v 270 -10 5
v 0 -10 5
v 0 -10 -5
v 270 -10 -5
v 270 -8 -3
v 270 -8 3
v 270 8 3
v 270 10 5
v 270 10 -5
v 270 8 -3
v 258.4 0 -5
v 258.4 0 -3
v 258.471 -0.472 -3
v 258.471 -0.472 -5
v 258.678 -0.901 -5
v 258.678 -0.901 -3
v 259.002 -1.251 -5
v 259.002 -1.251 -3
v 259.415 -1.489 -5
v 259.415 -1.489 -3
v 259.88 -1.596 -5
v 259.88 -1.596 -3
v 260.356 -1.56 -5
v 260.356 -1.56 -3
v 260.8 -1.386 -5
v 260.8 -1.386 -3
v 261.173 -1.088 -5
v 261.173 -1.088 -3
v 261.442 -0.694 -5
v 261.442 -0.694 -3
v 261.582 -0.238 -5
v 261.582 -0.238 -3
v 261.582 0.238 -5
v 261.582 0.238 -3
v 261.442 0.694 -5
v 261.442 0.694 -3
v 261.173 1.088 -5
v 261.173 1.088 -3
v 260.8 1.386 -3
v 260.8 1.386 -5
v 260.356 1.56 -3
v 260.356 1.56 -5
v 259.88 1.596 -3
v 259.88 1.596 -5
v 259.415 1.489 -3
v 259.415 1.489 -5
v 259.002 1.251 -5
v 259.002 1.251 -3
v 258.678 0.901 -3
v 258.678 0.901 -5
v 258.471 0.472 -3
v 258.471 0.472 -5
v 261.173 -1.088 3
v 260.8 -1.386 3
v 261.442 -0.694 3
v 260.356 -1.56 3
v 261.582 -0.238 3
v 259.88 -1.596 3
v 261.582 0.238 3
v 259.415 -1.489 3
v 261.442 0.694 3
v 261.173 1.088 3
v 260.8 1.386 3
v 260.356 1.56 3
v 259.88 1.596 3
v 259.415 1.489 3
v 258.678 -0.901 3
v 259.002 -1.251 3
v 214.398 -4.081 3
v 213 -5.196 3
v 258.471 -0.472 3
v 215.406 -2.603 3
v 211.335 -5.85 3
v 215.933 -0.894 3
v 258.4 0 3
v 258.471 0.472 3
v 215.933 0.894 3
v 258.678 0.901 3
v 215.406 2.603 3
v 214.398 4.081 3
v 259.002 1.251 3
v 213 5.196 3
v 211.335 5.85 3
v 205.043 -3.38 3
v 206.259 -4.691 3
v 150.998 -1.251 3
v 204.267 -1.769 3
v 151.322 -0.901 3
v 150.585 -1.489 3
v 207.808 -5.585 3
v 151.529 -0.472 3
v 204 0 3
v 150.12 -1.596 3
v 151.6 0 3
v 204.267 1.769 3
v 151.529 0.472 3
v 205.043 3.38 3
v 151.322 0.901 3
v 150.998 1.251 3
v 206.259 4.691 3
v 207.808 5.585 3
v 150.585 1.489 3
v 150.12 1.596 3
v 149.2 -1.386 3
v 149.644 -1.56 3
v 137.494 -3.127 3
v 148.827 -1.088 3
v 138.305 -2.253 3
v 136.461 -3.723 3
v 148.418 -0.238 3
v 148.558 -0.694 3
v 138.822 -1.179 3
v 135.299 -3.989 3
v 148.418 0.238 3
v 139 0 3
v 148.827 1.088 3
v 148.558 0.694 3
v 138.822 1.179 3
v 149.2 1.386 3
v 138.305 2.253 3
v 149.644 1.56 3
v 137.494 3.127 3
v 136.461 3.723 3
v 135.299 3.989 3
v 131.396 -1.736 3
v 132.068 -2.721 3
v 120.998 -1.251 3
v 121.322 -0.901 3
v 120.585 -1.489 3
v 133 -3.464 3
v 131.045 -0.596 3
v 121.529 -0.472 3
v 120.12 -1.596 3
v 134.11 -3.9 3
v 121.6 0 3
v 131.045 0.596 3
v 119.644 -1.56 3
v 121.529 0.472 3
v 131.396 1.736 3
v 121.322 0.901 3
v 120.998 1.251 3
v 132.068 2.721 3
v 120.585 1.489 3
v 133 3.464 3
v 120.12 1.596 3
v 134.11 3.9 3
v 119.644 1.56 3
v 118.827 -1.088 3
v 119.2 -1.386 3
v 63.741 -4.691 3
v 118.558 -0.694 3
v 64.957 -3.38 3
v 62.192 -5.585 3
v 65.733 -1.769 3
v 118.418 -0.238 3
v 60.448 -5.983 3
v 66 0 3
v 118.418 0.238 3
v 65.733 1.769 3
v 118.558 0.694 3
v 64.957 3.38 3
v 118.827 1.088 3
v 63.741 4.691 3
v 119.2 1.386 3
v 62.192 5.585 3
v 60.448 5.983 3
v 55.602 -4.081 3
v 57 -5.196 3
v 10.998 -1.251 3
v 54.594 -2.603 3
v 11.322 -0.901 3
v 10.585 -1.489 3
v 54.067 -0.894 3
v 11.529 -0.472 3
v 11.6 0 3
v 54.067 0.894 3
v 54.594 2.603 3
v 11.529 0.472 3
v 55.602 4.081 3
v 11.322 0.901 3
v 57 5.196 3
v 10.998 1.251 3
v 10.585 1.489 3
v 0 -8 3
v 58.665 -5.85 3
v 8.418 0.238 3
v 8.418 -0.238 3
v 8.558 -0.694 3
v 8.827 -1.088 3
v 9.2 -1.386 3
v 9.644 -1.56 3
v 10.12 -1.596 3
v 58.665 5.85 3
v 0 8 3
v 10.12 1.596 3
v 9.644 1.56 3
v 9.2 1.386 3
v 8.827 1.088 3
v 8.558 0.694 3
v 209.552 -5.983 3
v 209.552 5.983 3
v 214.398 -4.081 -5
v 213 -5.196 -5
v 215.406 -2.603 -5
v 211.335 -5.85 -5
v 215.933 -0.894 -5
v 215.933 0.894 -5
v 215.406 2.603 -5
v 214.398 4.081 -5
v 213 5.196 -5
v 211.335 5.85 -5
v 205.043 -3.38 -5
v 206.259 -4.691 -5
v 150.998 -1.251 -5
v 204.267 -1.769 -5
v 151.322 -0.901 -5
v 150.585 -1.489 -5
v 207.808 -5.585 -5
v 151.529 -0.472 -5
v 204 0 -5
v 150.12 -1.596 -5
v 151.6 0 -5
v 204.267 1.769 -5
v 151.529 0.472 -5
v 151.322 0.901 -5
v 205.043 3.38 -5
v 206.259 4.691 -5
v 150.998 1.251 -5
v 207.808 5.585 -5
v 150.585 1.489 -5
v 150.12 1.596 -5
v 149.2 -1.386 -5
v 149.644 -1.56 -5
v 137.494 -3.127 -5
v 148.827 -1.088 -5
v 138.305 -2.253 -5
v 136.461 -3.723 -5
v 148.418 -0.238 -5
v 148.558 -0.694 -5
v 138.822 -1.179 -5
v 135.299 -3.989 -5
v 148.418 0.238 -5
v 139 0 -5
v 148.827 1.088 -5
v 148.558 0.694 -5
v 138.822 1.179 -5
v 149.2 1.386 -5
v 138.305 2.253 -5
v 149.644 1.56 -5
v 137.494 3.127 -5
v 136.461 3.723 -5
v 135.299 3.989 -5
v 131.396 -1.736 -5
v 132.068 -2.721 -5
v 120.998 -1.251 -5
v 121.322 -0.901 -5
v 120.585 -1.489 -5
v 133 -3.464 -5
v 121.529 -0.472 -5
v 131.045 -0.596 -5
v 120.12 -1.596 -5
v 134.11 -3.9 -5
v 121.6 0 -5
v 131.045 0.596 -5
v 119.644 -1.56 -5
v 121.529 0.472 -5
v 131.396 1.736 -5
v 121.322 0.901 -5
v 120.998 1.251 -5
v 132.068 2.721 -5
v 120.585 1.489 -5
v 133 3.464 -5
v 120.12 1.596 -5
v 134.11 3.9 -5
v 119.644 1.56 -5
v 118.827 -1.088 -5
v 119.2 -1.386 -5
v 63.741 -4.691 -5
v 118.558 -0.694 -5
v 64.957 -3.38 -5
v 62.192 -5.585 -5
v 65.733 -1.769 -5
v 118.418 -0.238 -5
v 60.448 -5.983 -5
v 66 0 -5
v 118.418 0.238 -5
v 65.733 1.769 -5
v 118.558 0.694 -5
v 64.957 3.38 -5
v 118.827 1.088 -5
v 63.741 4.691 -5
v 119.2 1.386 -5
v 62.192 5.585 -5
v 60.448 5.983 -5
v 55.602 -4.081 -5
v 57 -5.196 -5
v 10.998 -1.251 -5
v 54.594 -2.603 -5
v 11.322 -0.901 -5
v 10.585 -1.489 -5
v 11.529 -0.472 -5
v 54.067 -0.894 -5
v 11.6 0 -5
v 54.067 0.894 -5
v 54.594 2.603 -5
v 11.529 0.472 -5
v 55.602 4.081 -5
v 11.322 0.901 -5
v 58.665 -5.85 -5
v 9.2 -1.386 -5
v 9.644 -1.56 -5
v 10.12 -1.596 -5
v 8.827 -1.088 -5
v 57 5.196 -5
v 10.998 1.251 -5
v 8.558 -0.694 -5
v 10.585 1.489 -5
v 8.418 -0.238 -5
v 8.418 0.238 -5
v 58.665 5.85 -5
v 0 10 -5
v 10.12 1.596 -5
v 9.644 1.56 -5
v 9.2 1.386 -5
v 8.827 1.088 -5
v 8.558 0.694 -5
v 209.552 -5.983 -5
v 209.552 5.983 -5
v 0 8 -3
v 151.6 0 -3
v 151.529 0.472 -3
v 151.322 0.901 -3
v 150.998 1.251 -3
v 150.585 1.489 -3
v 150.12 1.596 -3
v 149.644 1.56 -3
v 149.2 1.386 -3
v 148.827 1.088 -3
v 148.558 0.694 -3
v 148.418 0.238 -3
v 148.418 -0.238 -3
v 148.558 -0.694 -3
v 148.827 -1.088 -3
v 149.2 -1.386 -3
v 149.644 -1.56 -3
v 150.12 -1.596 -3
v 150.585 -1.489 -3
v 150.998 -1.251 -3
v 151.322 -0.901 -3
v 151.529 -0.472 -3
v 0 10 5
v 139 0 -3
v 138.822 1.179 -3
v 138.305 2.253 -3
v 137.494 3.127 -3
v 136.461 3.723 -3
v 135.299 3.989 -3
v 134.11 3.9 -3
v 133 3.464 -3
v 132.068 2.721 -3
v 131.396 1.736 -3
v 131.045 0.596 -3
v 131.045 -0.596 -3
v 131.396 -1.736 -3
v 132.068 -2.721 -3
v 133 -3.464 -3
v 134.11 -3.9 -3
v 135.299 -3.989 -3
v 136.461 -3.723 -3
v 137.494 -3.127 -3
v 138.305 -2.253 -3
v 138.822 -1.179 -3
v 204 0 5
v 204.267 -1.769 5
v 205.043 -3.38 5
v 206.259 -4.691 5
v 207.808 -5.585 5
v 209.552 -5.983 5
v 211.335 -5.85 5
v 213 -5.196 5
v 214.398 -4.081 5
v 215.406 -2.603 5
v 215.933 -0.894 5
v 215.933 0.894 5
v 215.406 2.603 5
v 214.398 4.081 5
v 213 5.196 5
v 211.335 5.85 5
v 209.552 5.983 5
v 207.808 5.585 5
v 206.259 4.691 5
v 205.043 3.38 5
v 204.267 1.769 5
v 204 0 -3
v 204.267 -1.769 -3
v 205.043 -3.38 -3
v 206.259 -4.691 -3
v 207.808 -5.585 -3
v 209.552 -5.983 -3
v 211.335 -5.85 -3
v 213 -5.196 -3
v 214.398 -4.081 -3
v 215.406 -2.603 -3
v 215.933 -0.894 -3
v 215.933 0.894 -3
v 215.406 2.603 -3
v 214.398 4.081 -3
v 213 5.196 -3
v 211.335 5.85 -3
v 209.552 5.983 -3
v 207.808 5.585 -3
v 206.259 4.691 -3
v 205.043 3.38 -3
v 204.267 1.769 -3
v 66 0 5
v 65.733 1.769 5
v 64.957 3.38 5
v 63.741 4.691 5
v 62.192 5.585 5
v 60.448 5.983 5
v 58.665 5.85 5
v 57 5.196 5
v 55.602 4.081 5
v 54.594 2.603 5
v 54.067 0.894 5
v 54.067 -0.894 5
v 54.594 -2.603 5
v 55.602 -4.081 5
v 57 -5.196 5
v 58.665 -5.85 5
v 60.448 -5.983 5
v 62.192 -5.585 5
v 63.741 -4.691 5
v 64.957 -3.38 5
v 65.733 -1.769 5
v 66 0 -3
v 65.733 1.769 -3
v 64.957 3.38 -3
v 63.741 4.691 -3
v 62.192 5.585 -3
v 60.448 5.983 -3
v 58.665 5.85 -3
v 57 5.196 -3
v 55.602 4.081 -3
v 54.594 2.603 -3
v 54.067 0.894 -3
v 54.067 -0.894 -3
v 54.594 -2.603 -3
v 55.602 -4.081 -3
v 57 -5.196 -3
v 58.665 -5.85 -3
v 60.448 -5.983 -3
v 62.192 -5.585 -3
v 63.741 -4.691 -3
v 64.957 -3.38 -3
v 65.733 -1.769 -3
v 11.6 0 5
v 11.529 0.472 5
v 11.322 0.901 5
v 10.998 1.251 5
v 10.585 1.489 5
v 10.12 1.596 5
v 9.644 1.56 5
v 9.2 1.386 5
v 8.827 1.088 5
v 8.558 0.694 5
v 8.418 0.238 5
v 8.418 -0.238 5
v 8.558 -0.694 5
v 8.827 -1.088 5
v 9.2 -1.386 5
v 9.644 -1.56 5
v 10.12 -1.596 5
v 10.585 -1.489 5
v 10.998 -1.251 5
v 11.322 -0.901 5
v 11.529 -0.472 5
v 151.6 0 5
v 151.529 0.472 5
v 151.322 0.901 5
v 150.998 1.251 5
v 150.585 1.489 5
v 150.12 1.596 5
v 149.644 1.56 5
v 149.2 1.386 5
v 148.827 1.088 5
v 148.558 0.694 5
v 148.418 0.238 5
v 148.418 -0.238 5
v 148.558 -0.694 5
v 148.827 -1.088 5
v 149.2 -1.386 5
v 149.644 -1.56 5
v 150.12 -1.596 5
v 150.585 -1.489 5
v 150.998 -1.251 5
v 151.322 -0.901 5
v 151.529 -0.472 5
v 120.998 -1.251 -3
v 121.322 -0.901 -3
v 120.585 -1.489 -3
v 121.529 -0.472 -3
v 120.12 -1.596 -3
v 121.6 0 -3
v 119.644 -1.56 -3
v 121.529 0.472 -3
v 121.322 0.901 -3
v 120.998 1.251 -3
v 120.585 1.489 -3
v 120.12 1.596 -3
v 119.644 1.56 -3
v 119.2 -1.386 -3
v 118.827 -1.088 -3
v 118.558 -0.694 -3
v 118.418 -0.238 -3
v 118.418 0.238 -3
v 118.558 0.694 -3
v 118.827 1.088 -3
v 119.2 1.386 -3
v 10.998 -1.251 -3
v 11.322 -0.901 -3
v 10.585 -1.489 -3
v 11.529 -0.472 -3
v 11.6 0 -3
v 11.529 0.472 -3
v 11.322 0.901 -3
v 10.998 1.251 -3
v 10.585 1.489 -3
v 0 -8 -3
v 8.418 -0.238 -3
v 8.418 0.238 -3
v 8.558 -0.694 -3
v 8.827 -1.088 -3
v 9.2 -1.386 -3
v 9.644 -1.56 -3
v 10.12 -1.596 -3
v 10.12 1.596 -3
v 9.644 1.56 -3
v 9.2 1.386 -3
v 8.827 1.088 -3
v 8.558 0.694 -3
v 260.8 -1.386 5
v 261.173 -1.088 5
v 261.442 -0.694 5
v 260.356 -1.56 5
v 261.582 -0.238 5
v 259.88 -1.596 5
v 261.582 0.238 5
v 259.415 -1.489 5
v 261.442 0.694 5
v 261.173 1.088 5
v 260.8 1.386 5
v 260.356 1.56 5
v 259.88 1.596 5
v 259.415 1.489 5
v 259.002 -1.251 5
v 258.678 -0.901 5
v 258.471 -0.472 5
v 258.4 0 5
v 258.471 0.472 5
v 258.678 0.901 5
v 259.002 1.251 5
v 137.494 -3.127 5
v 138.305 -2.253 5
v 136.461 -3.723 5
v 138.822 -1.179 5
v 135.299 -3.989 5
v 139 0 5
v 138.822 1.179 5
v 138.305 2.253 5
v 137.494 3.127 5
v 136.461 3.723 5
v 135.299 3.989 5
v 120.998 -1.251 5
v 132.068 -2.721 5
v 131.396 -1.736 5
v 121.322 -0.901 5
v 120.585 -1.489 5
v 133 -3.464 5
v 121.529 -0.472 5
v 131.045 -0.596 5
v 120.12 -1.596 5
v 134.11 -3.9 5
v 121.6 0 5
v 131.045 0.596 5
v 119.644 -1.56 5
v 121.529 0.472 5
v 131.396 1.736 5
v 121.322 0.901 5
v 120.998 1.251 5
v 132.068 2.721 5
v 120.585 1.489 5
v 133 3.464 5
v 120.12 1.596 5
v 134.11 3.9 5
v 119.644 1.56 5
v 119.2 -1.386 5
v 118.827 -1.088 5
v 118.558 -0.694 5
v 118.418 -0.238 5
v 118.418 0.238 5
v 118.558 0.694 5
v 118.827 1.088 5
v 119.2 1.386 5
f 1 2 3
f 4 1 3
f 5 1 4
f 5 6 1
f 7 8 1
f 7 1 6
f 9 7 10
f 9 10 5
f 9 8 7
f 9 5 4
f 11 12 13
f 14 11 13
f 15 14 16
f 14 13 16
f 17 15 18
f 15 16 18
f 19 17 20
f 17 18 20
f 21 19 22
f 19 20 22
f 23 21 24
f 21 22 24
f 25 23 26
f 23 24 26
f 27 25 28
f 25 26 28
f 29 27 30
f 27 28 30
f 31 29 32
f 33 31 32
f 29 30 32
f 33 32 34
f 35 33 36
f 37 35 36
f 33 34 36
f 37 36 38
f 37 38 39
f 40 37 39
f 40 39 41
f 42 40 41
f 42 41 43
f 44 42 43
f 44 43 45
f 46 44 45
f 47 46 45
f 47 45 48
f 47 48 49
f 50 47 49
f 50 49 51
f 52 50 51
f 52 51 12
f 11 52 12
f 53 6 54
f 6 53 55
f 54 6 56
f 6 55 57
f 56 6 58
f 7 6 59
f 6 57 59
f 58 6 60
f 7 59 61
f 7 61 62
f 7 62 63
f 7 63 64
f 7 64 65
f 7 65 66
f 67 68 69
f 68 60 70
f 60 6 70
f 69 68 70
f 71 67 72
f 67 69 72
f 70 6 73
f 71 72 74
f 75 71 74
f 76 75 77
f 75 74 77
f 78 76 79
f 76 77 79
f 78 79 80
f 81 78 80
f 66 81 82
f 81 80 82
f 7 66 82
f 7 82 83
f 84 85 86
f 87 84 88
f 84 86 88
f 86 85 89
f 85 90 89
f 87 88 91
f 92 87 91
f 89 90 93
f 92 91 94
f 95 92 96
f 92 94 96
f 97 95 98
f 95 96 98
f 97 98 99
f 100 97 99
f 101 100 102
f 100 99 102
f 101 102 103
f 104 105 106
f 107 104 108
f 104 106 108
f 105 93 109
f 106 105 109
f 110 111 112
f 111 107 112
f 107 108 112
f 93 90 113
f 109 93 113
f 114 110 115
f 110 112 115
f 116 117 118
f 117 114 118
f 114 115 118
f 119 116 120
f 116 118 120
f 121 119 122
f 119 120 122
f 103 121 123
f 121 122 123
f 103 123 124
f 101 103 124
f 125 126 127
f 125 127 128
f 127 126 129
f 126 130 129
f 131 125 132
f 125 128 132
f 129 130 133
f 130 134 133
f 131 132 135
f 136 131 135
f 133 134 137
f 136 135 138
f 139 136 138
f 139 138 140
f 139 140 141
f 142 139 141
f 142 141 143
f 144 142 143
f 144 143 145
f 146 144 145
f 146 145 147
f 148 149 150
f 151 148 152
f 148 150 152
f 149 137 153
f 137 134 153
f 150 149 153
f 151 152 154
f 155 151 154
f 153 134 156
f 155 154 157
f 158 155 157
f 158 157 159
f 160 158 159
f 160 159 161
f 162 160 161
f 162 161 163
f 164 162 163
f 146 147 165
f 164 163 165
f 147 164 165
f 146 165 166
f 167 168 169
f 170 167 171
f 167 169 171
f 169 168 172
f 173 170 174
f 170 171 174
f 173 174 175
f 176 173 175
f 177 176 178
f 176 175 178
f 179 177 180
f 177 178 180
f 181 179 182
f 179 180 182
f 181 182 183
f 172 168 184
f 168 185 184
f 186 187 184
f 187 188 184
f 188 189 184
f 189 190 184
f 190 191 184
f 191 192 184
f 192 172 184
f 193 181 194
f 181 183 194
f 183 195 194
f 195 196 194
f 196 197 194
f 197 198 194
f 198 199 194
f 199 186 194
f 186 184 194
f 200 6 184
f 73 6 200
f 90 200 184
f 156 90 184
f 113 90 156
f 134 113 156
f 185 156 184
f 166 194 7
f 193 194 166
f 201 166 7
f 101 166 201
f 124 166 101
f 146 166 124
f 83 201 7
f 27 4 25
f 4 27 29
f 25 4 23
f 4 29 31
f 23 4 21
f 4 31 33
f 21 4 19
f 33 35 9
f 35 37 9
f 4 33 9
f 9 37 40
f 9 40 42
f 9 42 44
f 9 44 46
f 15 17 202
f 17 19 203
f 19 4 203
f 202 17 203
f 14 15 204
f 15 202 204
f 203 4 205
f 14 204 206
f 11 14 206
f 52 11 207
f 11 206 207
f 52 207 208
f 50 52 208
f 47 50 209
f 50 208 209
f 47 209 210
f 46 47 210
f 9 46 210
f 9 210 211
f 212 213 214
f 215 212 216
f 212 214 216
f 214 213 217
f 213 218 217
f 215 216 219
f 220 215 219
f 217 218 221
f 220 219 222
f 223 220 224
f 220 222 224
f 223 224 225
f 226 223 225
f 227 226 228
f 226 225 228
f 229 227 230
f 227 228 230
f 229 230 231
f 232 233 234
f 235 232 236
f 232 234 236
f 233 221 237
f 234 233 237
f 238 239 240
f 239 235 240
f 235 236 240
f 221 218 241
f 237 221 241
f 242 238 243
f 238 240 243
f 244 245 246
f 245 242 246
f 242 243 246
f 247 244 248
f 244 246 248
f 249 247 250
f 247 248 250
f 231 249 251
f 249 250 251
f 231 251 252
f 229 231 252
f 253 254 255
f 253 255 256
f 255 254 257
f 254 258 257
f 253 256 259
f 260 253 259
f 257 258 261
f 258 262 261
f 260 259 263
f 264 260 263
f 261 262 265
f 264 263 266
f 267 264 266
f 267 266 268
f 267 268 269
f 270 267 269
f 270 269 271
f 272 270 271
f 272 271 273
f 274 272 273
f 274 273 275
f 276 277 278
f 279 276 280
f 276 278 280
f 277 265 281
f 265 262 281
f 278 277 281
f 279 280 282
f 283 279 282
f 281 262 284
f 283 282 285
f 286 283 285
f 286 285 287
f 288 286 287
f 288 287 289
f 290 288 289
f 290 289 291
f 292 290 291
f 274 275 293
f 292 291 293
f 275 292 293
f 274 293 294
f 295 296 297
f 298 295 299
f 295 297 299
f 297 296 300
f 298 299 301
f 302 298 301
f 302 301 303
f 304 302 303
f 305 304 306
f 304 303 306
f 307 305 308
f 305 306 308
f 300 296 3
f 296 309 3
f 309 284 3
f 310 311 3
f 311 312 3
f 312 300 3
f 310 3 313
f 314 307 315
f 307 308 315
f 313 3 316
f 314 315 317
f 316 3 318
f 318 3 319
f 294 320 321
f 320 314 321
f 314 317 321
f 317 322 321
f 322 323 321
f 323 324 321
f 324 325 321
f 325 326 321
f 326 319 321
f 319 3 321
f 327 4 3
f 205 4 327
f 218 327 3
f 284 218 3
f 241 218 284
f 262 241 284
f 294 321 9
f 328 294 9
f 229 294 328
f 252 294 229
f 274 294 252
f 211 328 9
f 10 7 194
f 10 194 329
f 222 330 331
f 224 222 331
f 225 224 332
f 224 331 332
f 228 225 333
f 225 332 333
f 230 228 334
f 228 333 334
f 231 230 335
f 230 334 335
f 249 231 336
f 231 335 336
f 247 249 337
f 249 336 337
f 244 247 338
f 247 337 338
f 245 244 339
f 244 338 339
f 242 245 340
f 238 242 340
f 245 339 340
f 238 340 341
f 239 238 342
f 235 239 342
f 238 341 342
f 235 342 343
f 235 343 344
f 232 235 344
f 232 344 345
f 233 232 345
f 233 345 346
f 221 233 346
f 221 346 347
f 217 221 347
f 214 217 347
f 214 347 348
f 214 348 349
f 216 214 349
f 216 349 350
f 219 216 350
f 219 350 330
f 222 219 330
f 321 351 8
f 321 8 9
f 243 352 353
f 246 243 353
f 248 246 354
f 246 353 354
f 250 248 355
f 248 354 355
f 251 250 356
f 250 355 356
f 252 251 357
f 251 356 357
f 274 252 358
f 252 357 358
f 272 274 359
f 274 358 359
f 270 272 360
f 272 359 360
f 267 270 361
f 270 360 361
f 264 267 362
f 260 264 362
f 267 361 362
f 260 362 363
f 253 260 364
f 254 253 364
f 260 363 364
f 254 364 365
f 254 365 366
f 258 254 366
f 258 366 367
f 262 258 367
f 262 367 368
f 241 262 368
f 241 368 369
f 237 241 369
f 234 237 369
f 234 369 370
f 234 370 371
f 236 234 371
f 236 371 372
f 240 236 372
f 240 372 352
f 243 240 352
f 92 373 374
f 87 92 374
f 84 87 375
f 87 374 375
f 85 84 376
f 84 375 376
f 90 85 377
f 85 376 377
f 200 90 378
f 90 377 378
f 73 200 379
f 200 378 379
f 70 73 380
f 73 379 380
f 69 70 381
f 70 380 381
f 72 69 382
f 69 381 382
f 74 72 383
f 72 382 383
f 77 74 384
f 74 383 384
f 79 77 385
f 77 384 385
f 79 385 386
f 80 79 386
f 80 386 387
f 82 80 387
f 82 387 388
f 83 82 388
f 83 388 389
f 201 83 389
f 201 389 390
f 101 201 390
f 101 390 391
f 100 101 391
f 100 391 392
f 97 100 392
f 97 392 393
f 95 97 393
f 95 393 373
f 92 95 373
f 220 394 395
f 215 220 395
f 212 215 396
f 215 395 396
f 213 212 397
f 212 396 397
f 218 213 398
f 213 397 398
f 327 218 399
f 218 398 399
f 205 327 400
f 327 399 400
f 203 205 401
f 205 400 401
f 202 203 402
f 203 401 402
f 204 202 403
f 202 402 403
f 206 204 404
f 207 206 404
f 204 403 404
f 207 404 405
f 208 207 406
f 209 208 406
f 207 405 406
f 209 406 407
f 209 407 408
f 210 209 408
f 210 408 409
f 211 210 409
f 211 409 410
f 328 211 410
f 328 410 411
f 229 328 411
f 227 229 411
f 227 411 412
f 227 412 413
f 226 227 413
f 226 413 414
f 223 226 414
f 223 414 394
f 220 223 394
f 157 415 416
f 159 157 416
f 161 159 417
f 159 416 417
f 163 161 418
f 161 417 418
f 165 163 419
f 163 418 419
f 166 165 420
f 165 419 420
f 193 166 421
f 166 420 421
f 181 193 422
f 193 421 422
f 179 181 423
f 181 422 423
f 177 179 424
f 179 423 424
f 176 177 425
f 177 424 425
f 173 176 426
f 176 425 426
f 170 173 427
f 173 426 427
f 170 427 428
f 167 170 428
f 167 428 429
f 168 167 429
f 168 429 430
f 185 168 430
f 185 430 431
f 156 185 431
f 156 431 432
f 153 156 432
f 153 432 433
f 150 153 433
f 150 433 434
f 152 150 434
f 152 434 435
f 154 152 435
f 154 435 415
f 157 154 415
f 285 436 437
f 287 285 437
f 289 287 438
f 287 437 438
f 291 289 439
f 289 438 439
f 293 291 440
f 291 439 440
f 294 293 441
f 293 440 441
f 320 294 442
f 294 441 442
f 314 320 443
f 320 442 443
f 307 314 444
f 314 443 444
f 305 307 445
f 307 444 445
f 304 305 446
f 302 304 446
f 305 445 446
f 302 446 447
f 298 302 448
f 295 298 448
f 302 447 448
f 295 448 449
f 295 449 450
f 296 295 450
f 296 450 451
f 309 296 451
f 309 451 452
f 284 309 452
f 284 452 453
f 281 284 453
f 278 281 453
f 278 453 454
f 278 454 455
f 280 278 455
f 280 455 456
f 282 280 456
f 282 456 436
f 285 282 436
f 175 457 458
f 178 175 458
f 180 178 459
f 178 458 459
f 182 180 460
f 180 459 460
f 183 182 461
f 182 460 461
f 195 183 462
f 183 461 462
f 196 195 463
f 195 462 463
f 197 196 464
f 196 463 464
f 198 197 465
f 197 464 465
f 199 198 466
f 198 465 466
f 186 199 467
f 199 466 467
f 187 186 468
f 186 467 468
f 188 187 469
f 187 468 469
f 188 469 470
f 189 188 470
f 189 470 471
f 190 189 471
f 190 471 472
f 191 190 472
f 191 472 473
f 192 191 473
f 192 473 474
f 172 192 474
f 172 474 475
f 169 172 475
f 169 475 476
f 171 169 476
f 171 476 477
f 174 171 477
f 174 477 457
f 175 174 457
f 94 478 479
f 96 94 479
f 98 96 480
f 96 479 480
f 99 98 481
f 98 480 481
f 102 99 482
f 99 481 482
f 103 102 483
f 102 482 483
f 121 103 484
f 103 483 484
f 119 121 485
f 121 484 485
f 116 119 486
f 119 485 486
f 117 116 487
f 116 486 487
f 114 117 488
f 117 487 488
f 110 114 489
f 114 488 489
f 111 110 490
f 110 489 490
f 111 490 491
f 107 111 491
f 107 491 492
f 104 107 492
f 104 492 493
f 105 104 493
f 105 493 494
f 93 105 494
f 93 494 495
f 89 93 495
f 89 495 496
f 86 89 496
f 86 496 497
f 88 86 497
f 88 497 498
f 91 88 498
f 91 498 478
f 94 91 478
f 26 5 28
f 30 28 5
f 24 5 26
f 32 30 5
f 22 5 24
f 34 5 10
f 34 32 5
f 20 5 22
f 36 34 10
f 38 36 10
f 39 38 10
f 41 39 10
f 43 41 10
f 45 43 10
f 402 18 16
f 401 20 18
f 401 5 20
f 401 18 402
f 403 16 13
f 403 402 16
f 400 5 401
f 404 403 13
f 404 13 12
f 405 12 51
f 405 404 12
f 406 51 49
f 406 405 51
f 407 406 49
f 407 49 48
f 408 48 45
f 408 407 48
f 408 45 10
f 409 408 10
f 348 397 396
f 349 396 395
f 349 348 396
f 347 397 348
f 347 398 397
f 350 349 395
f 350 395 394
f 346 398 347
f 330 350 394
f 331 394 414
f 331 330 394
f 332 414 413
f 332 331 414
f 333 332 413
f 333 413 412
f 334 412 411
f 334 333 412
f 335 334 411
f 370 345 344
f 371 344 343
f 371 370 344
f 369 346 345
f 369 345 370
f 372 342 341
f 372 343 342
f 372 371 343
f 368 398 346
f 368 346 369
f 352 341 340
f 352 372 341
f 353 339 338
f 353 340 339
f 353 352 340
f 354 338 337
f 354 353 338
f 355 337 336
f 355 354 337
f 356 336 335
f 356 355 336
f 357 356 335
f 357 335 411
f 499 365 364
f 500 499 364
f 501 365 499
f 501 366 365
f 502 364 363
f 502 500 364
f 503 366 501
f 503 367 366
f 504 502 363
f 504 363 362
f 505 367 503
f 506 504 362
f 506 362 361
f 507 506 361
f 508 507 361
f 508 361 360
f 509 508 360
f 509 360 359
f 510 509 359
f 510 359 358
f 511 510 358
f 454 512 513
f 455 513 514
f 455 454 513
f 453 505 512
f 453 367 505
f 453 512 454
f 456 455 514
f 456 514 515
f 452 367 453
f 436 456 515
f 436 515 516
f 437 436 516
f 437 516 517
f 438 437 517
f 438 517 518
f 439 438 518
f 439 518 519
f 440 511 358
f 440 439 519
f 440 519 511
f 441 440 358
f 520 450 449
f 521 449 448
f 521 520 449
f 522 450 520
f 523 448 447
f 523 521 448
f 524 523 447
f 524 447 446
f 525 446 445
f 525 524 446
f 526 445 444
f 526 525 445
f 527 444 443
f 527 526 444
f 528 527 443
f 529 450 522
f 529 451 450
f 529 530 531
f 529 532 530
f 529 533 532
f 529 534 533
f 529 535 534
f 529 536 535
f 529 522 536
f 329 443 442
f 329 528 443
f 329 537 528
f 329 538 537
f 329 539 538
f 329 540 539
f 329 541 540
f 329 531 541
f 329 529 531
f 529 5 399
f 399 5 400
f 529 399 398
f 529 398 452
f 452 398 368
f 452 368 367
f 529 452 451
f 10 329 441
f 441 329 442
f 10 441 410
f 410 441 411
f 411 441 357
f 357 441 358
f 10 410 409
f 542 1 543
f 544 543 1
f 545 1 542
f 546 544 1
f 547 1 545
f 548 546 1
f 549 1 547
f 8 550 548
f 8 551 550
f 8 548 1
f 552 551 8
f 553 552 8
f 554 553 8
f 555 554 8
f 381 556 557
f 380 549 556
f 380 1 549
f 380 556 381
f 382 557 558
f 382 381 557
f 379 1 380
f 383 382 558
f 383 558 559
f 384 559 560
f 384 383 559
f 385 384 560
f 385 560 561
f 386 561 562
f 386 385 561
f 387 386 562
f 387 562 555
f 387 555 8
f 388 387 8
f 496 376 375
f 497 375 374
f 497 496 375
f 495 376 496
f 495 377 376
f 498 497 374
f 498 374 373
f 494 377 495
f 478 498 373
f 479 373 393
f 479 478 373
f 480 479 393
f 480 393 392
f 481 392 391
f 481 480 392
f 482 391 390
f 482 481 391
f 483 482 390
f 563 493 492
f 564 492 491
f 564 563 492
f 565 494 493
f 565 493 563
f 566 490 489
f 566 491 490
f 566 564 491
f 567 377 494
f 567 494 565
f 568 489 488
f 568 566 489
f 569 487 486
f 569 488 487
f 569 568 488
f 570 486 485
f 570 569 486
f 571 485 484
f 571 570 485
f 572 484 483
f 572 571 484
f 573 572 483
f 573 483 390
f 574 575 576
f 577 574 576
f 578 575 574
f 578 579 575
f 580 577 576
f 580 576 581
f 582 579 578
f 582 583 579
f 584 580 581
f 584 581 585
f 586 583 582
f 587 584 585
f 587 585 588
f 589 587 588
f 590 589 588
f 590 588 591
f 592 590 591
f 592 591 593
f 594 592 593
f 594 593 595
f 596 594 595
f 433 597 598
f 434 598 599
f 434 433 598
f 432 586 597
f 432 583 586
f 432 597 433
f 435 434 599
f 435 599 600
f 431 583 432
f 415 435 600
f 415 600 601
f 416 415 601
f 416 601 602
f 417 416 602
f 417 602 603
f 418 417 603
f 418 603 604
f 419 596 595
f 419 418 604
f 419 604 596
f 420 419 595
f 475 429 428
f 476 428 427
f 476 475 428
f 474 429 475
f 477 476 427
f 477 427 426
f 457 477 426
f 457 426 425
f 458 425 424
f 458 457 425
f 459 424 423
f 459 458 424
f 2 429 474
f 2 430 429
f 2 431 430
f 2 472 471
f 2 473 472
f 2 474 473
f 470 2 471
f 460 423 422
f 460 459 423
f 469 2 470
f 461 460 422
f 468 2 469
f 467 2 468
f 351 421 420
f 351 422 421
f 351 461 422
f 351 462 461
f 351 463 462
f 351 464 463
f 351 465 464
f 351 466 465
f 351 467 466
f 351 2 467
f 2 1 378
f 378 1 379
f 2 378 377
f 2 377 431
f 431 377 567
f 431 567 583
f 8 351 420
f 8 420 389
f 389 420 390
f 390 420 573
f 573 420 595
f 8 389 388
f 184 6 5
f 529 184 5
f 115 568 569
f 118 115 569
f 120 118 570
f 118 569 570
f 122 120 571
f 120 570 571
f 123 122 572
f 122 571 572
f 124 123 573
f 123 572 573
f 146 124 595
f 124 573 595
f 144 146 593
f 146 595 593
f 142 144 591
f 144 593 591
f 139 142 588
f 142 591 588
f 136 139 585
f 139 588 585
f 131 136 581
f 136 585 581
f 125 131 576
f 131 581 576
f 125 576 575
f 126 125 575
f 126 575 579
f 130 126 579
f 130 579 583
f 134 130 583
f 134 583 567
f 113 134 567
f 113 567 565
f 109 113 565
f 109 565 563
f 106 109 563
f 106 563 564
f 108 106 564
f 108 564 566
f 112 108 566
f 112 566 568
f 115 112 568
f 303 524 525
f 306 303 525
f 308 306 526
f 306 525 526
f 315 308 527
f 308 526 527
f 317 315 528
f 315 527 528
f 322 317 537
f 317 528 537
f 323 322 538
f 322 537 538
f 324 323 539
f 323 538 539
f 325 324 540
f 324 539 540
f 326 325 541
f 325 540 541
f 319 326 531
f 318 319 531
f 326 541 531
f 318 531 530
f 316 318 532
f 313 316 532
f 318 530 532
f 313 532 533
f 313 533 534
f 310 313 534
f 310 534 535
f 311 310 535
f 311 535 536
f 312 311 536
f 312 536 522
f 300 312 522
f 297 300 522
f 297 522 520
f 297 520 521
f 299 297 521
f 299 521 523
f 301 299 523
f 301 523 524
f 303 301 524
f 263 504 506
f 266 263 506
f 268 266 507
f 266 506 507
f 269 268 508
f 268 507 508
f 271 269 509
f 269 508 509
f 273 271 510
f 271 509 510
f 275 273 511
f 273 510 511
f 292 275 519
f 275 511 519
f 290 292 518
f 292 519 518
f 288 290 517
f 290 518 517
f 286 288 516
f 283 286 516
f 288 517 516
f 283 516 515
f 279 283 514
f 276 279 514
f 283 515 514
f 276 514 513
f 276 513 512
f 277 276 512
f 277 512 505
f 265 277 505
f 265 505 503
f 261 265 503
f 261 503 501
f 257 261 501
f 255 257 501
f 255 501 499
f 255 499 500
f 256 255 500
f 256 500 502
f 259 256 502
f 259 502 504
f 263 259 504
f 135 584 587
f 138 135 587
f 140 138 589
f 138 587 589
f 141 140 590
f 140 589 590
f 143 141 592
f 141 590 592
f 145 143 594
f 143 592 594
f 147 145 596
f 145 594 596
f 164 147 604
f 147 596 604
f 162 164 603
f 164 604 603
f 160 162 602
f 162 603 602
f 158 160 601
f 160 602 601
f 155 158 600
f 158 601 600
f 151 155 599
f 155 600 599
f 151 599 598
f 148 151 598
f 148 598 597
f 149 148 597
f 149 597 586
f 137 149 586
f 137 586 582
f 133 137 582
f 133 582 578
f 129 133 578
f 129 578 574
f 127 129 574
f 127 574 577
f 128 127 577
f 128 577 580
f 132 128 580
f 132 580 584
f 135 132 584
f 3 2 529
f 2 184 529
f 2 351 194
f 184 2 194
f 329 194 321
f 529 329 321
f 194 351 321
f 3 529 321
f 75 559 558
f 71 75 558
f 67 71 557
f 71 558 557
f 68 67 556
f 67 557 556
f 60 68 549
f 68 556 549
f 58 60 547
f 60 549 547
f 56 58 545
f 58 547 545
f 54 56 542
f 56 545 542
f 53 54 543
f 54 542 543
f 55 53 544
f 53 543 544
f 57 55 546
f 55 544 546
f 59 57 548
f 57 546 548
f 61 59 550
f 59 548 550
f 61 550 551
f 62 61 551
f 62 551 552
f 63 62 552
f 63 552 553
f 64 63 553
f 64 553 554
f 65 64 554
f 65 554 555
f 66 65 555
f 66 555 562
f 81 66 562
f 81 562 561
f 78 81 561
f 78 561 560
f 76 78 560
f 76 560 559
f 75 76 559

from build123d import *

# Parameters (mm, degrees)
SKETCH_15_W         = 10
SKETCH_15_H         = 20
SKETCH_15_W_2       = 6
SKETCH_15_H_2       = 16
F_20X10X2_2_DEPTH   = 270
SKETCH_12_R         = 1.6
CUT_EXTRUDE_1_DEPTH = 271.370116692
SKETCH_16_R         = 6
CUT_EXTRUDE_2_DEPTH = 271.370116692
SKETCH_17_R         = 4
CUT_EXTRUDE_3_DEPTH = 18
SKETCH_18_R         = 1.6
CUT_EXTRUDE_4_DEPTH = 10


with BuildPart() as part:
    # 草图15 → 铝方管 20X10X2(2) (new body)
    with BuildSketch(Plane(origin=(0, 0, 0), x_dir=(0, 0, -1), z_dir=(1, 0, 0))):
        Rectangle(SKETCH_15_W, SKETCH_15_H)
        Rectangle(SKETCH_15_W_2, SKETCH_15_H_2, mode=Mode.SUBTRACT)
    extrude(amount=F_20X10X2_2_DEPTH)

    # 草图12 → 切除-拉伸1 (cut, through all)
    with BuildSketch(Plane.XY.offset(5)):
        with Locations((10, 0)):
            Circle(SKETCH_12_R)
        with Locations(Location((260, 0, 0), (0, 0, 180))):
            Circle(SKETCH_12_R)
    extrude(amount=-CUT_EXTRUDE_1_DEPTH, mode=Mode.SUBTRACT)

    # 草图16 → 切除-拉伸2 (cut, through all)
    with BuildSketch(Plane.XY.offset(5)):
        with Locations((60, 0)):
            Circle(SKETCH_16_R)
        with Locations(Location((210, 0, 0), (0, 0, 180))):
            Circle(SKETCH_16_R)
    extrude(amount=-CUT_EXTRUDE_2_DEPTH, mode=Mode.SUBTRACT)

    # 草图17 → 切除-拉伸3 (cut)
    with BuildSketch(Plane.XY.offset(5)):
        with Locations((135, 0)):
            Circle(SKETCH_17_R)
    extrude(amount=-CUT_EXTRUDE_3_DEPTH, mode=Mode.SUBTRACT)

    # 草图18 → 切除-拉伸4 (cut)
    with BuildSketch(Plane.XY.offset(5)):
        with Locations((120, 0)):
            Circle(SKETCH_18_R)
        with Locations((150, 0)):
            Circle(SKETCH_18_R)
    extrude(amount=-CUT_EXTRUDE_4_DEPTH, mode=Mode.SUBTRACT)


solid = part.part
